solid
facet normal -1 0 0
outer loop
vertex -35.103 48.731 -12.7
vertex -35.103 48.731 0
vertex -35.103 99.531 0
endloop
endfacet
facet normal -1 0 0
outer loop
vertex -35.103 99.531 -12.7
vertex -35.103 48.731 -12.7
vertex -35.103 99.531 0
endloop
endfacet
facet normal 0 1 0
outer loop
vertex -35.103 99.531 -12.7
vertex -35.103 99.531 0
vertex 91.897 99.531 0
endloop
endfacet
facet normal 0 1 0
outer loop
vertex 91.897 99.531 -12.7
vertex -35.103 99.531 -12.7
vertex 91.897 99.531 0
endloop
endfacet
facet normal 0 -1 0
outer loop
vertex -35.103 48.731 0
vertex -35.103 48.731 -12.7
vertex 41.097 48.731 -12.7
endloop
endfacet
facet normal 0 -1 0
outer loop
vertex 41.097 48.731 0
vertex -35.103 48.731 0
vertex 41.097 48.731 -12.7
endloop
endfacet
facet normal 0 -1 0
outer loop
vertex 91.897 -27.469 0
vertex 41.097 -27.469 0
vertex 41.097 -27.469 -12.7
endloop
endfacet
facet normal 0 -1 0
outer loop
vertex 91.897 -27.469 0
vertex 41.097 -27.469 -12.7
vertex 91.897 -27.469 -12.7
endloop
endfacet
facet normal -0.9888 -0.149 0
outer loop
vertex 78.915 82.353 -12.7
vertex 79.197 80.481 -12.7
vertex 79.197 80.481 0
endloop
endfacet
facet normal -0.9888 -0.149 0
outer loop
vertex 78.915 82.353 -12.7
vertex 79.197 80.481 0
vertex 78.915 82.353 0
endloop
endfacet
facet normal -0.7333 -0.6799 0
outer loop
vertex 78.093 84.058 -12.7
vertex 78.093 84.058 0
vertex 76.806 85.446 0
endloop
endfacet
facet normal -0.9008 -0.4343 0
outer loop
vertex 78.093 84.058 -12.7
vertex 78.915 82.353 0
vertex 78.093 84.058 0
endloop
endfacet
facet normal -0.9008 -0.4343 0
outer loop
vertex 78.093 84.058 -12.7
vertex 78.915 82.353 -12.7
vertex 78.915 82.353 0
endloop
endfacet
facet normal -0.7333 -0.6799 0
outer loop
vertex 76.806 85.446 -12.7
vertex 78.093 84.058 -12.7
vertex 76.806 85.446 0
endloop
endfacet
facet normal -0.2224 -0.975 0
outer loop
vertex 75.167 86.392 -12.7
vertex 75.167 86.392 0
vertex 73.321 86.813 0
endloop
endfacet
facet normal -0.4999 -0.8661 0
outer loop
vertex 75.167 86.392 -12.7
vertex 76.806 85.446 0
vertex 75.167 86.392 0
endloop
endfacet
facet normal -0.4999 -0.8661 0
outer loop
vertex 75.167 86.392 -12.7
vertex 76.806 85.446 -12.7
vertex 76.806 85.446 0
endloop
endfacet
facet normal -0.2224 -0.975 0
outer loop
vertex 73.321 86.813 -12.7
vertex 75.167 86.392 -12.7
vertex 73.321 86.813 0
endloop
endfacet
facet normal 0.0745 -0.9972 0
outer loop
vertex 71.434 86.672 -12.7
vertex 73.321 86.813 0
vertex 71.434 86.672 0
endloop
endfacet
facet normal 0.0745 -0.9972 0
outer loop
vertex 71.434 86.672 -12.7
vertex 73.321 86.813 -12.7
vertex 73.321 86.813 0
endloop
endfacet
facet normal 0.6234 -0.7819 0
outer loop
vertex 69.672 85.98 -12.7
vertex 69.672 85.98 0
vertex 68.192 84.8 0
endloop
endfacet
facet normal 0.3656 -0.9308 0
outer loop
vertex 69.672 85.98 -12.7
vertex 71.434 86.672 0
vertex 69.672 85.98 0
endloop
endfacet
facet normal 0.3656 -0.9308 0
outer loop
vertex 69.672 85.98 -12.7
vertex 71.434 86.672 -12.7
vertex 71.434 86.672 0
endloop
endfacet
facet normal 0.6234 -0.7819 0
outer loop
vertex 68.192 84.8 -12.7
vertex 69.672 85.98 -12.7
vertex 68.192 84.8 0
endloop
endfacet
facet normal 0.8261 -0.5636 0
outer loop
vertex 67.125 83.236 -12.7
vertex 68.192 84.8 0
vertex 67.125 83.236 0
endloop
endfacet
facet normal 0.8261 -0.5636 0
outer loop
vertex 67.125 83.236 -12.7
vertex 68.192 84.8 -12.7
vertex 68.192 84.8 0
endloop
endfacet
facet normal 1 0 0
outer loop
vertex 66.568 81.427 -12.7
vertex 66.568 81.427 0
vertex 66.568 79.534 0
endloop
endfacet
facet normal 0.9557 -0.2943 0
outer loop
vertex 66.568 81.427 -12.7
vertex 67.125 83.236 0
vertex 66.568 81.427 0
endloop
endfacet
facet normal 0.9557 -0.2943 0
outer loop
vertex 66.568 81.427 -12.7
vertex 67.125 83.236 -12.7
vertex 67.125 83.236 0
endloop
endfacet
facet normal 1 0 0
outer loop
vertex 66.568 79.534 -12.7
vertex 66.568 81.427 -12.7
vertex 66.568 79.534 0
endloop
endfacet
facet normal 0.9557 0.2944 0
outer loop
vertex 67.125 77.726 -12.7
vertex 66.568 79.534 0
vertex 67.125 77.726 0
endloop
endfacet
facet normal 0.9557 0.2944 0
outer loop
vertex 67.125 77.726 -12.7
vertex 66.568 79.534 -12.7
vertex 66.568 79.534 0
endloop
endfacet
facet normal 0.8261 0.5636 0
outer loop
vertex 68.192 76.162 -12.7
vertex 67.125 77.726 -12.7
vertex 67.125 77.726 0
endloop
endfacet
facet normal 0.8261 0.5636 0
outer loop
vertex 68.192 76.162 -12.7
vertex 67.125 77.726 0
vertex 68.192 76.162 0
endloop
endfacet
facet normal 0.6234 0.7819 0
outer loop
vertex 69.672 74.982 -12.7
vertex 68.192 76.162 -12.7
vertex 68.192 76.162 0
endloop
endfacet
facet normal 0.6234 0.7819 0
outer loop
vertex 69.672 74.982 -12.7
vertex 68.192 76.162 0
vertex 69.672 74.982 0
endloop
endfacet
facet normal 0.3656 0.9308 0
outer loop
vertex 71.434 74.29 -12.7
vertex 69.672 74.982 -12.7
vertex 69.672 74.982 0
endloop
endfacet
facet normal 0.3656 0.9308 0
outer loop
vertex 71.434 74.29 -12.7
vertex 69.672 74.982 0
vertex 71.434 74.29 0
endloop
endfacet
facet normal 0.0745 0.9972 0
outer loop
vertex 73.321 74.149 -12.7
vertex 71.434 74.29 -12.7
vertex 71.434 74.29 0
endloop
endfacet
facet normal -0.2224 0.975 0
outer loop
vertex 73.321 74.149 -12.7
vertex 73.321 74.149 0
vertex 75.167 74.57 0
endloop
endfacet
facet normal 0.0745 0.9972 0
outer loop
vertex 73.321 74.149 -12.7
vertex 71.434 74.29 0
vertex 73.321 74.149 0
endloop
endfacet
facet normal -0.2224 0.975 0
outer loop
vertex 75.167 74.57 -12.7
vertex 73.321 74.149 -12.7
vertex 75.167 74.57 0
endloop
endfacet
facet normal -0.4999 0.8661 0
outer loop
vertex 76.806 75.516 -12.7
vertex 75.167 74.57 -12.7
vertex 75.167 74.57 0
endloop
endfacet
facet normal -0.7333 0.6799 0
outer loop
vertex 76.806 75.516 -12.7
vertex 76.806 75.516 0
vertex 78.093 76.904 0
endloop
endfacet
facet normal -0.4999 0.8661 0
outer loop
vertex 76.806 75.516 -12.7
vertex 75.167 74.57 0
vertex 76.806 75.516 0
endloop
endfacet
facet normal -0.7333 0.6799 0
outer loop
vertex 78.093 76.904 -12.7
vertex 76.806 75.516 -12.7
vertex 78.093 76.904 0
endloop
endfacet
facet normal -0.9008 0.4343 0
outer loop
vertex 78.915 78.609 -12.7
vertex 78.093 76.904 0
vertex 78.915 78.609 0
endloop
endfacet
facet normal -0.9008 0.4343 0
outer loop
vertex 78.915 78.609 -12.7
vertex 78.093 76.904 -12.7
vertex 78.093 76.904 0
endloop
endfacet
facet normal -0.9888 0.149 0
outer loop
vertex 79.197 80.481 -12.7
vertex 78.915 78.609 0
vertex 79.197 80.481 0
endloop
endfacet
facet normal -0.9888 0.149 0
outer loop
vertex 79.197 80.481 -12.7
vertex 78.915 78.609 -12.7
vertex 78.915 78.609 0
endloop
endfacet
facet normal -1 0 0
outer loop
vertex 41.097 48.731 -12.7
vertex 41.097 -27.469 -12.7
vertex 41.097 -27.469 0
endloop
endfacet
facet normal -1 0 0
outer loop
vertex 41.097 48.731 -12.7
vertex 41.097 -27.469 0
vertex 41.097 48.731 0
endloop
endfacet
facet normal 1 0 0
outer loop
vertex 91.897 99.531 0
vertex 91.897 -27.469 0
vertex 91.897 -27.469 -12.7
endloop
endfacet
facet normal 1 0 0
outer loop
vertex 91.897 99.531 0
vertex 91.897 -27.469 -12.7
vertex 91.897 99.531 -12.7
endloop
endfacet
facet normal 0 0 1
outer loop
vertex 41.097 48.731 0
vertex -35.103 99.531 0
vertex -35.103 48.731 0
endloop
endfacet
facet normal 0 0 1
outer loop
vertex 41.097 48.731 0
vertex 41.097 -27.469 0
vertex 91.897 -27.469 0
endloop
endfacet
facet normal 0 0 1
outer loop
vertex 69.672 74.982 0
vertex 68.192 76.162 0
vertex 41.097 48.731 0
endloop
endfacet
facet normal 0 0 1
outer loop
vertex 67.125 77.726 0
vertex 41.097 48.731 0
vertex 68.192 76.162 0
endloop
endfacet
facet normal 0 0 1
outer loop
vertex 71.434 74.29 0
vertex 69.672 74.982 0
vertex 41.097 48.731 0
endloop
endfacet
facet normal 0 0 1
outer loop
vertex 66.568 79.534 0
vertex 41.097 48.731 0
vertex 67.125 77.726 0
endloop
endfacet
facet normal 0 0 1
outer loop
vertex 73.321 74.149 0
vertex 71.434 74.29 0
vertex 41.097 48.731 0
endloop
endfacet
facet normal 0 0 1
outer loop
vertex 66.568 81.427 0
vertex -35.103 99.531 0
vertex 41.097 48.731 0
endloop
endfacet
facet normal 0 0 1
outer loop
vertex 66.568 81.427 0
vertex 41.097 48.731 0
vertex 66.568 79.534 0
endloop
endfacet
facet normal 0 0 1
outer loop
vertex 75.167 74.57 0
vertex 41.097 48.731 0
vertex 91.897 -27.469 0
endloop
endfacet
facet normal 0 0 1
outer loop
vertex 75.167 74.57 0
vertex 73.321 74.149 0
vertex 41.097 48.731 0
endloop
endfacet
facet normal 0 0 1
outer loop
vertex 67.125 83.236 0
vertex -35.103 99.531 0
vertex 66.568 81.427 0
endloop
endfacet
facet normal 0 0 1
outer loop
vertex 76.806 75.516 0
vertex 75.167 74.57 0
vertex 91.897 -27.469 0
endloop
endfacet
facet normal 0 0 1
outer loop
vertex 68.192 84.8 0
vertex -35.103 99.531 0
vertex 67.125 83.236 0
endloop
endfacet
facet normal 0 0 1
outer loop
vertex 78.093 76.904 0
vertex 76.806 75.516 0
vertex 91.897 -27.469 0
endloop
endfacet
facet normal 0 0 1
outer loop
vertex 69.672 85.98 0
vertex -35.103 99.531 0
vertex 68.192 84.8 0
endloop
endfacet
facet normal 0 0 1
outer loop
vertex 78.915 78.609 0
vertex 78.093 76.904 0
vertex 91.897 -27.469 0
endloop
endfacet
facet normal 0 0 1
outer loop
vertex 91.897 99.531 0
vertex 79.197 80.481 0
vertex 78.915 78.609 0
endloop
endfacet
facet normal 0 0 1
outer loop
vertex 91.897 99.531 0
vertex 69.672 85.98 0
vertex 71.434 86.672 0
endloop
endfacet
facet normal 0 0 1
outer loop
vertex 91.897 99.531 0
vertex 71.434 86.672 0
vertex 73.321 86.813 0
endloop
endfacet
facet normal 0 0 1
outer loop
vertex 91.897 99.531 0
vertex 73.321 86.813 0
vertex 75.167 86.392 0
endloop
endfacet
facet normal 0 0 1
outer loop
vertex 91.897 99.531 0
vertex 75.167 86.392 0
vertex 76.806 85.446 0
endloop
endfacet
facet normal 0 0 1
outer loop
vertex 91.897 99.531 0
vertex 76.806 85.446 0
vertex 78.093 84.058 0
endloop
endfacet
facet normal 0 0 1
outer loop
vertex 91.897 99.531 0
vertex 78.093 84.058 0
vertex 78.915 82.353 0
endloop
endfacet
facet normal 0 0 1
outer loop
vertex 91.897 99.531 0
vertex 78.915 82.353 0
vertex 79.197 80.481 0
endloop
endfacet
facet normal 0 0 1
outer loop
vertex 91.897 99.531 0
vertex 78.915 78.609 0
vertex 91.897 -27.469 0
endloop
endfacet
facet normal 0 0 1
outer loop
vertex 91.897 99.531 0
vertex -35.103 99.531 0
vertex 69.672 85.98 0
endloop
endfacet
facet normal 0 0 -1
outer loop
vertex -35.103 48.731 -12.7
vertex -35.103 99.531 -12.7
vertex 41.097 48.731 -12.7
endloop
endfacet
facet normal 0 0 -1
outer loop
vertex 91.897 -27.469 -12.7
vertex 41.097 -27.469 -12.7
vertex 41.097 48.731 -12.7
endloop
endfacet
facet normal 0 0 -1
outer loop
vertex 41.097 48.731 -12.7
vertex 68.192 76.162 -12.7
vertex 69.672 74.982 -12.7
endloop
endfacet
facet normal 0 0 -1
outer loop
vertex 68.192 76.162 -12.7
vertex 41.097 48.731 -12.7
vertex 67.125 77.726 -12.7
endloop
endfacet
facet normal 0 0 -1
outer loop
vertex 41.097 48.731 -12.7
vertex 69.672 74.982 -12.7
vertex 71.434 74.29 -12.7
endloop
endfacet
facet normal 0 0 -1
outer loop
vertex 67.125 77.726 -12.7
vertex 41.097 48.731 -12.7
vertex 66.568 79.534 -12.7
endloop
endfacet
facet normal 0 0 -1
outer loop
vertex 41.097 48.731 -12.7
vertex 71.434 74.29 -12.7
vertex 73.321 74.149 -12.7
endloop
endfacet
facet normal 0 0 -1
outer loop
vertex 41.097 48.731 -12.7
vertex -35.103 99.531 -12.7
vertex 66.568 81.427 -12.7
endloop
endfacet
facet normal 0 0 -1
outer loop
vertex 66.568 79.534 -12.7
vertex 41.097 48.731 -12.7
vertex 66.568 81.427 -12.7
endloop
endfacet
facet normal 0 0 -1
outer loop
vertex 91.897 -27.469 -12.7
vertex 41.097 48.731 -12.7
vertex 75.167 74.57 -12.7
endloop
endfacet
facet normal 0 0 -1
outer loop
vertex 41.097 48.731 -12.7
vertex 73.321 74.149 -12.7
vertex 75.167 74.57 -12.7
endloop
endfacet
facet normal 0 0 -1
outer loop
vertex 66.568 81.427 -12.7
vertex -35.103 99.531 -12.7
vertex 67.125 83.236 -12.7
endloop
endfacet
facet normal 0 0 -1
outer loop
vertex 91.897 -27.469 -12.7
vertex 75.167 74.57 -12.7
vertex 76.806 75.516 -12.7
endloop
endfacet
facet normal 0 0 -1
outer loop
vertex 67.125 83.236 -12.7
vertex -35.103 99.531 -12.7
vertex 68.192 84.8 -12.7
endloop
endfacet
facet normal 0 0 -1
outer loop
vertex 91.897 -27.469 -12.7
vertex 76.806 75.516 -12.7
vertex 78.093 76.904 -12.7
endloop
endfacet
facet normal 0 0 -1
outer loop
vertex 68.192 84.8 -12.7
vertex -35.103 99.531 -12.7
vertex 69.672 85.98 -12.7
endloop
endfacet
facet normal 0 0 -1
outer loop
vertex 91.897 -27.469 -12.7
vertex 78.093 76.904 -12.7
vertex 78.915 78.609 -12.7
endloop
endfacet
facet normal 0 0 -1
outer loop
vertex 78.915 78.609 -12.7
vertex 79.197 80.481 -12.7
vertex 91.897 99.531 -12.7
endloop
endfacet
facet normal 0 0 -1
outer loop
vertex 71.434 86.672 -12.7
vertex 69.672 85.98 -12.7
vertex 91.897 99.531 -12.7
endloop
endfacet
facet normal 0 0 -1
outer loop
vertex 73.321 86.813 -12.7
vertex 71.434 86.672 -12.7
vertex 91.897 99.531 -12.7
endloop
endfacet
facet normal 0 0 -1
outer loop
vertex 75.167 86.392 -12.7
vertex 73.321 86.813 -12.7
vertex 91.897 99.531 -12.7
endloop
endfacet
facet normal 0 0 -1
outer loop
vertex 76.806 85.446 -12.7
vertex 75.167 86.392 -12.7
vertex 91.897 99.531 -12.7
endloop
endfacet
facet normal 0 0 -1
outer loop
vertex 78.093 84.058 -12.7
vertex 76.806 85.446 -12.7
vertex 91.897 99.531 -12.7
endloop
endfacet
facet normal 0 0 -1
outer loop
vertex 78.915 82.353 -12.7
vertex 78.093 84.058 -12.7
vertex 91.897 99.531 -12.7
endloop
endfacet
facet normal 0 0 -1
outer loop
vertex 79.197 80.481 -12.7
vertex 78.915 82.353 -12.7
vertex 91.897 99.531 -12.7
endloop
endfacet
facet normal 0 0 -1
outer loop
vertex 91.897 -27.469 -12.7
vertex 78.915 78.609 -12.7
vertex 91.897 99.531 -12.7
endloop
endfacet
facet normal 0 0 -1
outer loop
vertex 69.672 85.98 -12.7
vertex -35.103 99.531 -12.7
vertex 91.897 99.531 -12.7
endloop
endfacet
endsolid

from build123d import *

# Parameters (mm, degrees)
SKETCH1_W               = 127
SKETCH1_H               = 127
BOSS_EXTRUDE1_DEPTH     = 12.7
CUT_EXTRUDE1_DEPTH      = 137.061310783
CUT_EXTRUDE1_DEPTH_BACK = 137.061310783
SKETCH3_W               = 76.2
SKETCH3_H               = 76.2
CUT_EXTRUDE2_DEPTH      = 137.061310783
CUT_EXTRUDE2_DEPTH_BACK = 137.061310783
SKETCH4_R               = 6.35


with BuildPart() as part:
    # Sketch1 → Boss-Extrude1 (new body)
    with BuildSketch(Plane.XY):
        with Locations((28.396629213, 36.030898876)):
            Rectangle(SKETCH1_W, SKETCH1_H)
    extrude(amount=-BOSS_EXTRUDE1_DEPTH)

    # Sketch3 → Cut-Extrude1 (cut, two sides: drawn at the far end of the back side and taken through both)
    with BuildSketch(Plane.XY.offset(-CUT_EXTRUDE1_DEPTH_BACK)):
        with Locations((2.996629213, 10.630898876)):
            Rectangle(SKETCH3_W, SKETCH3_H)
    extrude(amount=CUT_EXTRUDE1_DEPTH + CUT_EXTRUDE1_DEPTH_BACK, mode=Mode.SUBTRACT)

    # Sketch4 → Cut-Extrude2 (cut, two sides: drawn at the far end of the back side and taken through both)
    with BuildSketch(Plane.XY.offset(-CUT_EXTRUDE2_DEPTH_BACK)):
        with Locations((72.846629213, 80.480898876)):
            Circle(SKETCH4_R)
    extrude(amount=CUT_EXTRUDE2_DEPTH + CUT_EXTRUDE2_DEPTH_BACK, mode=Mode.SUBTRACT)


solid = part.part
